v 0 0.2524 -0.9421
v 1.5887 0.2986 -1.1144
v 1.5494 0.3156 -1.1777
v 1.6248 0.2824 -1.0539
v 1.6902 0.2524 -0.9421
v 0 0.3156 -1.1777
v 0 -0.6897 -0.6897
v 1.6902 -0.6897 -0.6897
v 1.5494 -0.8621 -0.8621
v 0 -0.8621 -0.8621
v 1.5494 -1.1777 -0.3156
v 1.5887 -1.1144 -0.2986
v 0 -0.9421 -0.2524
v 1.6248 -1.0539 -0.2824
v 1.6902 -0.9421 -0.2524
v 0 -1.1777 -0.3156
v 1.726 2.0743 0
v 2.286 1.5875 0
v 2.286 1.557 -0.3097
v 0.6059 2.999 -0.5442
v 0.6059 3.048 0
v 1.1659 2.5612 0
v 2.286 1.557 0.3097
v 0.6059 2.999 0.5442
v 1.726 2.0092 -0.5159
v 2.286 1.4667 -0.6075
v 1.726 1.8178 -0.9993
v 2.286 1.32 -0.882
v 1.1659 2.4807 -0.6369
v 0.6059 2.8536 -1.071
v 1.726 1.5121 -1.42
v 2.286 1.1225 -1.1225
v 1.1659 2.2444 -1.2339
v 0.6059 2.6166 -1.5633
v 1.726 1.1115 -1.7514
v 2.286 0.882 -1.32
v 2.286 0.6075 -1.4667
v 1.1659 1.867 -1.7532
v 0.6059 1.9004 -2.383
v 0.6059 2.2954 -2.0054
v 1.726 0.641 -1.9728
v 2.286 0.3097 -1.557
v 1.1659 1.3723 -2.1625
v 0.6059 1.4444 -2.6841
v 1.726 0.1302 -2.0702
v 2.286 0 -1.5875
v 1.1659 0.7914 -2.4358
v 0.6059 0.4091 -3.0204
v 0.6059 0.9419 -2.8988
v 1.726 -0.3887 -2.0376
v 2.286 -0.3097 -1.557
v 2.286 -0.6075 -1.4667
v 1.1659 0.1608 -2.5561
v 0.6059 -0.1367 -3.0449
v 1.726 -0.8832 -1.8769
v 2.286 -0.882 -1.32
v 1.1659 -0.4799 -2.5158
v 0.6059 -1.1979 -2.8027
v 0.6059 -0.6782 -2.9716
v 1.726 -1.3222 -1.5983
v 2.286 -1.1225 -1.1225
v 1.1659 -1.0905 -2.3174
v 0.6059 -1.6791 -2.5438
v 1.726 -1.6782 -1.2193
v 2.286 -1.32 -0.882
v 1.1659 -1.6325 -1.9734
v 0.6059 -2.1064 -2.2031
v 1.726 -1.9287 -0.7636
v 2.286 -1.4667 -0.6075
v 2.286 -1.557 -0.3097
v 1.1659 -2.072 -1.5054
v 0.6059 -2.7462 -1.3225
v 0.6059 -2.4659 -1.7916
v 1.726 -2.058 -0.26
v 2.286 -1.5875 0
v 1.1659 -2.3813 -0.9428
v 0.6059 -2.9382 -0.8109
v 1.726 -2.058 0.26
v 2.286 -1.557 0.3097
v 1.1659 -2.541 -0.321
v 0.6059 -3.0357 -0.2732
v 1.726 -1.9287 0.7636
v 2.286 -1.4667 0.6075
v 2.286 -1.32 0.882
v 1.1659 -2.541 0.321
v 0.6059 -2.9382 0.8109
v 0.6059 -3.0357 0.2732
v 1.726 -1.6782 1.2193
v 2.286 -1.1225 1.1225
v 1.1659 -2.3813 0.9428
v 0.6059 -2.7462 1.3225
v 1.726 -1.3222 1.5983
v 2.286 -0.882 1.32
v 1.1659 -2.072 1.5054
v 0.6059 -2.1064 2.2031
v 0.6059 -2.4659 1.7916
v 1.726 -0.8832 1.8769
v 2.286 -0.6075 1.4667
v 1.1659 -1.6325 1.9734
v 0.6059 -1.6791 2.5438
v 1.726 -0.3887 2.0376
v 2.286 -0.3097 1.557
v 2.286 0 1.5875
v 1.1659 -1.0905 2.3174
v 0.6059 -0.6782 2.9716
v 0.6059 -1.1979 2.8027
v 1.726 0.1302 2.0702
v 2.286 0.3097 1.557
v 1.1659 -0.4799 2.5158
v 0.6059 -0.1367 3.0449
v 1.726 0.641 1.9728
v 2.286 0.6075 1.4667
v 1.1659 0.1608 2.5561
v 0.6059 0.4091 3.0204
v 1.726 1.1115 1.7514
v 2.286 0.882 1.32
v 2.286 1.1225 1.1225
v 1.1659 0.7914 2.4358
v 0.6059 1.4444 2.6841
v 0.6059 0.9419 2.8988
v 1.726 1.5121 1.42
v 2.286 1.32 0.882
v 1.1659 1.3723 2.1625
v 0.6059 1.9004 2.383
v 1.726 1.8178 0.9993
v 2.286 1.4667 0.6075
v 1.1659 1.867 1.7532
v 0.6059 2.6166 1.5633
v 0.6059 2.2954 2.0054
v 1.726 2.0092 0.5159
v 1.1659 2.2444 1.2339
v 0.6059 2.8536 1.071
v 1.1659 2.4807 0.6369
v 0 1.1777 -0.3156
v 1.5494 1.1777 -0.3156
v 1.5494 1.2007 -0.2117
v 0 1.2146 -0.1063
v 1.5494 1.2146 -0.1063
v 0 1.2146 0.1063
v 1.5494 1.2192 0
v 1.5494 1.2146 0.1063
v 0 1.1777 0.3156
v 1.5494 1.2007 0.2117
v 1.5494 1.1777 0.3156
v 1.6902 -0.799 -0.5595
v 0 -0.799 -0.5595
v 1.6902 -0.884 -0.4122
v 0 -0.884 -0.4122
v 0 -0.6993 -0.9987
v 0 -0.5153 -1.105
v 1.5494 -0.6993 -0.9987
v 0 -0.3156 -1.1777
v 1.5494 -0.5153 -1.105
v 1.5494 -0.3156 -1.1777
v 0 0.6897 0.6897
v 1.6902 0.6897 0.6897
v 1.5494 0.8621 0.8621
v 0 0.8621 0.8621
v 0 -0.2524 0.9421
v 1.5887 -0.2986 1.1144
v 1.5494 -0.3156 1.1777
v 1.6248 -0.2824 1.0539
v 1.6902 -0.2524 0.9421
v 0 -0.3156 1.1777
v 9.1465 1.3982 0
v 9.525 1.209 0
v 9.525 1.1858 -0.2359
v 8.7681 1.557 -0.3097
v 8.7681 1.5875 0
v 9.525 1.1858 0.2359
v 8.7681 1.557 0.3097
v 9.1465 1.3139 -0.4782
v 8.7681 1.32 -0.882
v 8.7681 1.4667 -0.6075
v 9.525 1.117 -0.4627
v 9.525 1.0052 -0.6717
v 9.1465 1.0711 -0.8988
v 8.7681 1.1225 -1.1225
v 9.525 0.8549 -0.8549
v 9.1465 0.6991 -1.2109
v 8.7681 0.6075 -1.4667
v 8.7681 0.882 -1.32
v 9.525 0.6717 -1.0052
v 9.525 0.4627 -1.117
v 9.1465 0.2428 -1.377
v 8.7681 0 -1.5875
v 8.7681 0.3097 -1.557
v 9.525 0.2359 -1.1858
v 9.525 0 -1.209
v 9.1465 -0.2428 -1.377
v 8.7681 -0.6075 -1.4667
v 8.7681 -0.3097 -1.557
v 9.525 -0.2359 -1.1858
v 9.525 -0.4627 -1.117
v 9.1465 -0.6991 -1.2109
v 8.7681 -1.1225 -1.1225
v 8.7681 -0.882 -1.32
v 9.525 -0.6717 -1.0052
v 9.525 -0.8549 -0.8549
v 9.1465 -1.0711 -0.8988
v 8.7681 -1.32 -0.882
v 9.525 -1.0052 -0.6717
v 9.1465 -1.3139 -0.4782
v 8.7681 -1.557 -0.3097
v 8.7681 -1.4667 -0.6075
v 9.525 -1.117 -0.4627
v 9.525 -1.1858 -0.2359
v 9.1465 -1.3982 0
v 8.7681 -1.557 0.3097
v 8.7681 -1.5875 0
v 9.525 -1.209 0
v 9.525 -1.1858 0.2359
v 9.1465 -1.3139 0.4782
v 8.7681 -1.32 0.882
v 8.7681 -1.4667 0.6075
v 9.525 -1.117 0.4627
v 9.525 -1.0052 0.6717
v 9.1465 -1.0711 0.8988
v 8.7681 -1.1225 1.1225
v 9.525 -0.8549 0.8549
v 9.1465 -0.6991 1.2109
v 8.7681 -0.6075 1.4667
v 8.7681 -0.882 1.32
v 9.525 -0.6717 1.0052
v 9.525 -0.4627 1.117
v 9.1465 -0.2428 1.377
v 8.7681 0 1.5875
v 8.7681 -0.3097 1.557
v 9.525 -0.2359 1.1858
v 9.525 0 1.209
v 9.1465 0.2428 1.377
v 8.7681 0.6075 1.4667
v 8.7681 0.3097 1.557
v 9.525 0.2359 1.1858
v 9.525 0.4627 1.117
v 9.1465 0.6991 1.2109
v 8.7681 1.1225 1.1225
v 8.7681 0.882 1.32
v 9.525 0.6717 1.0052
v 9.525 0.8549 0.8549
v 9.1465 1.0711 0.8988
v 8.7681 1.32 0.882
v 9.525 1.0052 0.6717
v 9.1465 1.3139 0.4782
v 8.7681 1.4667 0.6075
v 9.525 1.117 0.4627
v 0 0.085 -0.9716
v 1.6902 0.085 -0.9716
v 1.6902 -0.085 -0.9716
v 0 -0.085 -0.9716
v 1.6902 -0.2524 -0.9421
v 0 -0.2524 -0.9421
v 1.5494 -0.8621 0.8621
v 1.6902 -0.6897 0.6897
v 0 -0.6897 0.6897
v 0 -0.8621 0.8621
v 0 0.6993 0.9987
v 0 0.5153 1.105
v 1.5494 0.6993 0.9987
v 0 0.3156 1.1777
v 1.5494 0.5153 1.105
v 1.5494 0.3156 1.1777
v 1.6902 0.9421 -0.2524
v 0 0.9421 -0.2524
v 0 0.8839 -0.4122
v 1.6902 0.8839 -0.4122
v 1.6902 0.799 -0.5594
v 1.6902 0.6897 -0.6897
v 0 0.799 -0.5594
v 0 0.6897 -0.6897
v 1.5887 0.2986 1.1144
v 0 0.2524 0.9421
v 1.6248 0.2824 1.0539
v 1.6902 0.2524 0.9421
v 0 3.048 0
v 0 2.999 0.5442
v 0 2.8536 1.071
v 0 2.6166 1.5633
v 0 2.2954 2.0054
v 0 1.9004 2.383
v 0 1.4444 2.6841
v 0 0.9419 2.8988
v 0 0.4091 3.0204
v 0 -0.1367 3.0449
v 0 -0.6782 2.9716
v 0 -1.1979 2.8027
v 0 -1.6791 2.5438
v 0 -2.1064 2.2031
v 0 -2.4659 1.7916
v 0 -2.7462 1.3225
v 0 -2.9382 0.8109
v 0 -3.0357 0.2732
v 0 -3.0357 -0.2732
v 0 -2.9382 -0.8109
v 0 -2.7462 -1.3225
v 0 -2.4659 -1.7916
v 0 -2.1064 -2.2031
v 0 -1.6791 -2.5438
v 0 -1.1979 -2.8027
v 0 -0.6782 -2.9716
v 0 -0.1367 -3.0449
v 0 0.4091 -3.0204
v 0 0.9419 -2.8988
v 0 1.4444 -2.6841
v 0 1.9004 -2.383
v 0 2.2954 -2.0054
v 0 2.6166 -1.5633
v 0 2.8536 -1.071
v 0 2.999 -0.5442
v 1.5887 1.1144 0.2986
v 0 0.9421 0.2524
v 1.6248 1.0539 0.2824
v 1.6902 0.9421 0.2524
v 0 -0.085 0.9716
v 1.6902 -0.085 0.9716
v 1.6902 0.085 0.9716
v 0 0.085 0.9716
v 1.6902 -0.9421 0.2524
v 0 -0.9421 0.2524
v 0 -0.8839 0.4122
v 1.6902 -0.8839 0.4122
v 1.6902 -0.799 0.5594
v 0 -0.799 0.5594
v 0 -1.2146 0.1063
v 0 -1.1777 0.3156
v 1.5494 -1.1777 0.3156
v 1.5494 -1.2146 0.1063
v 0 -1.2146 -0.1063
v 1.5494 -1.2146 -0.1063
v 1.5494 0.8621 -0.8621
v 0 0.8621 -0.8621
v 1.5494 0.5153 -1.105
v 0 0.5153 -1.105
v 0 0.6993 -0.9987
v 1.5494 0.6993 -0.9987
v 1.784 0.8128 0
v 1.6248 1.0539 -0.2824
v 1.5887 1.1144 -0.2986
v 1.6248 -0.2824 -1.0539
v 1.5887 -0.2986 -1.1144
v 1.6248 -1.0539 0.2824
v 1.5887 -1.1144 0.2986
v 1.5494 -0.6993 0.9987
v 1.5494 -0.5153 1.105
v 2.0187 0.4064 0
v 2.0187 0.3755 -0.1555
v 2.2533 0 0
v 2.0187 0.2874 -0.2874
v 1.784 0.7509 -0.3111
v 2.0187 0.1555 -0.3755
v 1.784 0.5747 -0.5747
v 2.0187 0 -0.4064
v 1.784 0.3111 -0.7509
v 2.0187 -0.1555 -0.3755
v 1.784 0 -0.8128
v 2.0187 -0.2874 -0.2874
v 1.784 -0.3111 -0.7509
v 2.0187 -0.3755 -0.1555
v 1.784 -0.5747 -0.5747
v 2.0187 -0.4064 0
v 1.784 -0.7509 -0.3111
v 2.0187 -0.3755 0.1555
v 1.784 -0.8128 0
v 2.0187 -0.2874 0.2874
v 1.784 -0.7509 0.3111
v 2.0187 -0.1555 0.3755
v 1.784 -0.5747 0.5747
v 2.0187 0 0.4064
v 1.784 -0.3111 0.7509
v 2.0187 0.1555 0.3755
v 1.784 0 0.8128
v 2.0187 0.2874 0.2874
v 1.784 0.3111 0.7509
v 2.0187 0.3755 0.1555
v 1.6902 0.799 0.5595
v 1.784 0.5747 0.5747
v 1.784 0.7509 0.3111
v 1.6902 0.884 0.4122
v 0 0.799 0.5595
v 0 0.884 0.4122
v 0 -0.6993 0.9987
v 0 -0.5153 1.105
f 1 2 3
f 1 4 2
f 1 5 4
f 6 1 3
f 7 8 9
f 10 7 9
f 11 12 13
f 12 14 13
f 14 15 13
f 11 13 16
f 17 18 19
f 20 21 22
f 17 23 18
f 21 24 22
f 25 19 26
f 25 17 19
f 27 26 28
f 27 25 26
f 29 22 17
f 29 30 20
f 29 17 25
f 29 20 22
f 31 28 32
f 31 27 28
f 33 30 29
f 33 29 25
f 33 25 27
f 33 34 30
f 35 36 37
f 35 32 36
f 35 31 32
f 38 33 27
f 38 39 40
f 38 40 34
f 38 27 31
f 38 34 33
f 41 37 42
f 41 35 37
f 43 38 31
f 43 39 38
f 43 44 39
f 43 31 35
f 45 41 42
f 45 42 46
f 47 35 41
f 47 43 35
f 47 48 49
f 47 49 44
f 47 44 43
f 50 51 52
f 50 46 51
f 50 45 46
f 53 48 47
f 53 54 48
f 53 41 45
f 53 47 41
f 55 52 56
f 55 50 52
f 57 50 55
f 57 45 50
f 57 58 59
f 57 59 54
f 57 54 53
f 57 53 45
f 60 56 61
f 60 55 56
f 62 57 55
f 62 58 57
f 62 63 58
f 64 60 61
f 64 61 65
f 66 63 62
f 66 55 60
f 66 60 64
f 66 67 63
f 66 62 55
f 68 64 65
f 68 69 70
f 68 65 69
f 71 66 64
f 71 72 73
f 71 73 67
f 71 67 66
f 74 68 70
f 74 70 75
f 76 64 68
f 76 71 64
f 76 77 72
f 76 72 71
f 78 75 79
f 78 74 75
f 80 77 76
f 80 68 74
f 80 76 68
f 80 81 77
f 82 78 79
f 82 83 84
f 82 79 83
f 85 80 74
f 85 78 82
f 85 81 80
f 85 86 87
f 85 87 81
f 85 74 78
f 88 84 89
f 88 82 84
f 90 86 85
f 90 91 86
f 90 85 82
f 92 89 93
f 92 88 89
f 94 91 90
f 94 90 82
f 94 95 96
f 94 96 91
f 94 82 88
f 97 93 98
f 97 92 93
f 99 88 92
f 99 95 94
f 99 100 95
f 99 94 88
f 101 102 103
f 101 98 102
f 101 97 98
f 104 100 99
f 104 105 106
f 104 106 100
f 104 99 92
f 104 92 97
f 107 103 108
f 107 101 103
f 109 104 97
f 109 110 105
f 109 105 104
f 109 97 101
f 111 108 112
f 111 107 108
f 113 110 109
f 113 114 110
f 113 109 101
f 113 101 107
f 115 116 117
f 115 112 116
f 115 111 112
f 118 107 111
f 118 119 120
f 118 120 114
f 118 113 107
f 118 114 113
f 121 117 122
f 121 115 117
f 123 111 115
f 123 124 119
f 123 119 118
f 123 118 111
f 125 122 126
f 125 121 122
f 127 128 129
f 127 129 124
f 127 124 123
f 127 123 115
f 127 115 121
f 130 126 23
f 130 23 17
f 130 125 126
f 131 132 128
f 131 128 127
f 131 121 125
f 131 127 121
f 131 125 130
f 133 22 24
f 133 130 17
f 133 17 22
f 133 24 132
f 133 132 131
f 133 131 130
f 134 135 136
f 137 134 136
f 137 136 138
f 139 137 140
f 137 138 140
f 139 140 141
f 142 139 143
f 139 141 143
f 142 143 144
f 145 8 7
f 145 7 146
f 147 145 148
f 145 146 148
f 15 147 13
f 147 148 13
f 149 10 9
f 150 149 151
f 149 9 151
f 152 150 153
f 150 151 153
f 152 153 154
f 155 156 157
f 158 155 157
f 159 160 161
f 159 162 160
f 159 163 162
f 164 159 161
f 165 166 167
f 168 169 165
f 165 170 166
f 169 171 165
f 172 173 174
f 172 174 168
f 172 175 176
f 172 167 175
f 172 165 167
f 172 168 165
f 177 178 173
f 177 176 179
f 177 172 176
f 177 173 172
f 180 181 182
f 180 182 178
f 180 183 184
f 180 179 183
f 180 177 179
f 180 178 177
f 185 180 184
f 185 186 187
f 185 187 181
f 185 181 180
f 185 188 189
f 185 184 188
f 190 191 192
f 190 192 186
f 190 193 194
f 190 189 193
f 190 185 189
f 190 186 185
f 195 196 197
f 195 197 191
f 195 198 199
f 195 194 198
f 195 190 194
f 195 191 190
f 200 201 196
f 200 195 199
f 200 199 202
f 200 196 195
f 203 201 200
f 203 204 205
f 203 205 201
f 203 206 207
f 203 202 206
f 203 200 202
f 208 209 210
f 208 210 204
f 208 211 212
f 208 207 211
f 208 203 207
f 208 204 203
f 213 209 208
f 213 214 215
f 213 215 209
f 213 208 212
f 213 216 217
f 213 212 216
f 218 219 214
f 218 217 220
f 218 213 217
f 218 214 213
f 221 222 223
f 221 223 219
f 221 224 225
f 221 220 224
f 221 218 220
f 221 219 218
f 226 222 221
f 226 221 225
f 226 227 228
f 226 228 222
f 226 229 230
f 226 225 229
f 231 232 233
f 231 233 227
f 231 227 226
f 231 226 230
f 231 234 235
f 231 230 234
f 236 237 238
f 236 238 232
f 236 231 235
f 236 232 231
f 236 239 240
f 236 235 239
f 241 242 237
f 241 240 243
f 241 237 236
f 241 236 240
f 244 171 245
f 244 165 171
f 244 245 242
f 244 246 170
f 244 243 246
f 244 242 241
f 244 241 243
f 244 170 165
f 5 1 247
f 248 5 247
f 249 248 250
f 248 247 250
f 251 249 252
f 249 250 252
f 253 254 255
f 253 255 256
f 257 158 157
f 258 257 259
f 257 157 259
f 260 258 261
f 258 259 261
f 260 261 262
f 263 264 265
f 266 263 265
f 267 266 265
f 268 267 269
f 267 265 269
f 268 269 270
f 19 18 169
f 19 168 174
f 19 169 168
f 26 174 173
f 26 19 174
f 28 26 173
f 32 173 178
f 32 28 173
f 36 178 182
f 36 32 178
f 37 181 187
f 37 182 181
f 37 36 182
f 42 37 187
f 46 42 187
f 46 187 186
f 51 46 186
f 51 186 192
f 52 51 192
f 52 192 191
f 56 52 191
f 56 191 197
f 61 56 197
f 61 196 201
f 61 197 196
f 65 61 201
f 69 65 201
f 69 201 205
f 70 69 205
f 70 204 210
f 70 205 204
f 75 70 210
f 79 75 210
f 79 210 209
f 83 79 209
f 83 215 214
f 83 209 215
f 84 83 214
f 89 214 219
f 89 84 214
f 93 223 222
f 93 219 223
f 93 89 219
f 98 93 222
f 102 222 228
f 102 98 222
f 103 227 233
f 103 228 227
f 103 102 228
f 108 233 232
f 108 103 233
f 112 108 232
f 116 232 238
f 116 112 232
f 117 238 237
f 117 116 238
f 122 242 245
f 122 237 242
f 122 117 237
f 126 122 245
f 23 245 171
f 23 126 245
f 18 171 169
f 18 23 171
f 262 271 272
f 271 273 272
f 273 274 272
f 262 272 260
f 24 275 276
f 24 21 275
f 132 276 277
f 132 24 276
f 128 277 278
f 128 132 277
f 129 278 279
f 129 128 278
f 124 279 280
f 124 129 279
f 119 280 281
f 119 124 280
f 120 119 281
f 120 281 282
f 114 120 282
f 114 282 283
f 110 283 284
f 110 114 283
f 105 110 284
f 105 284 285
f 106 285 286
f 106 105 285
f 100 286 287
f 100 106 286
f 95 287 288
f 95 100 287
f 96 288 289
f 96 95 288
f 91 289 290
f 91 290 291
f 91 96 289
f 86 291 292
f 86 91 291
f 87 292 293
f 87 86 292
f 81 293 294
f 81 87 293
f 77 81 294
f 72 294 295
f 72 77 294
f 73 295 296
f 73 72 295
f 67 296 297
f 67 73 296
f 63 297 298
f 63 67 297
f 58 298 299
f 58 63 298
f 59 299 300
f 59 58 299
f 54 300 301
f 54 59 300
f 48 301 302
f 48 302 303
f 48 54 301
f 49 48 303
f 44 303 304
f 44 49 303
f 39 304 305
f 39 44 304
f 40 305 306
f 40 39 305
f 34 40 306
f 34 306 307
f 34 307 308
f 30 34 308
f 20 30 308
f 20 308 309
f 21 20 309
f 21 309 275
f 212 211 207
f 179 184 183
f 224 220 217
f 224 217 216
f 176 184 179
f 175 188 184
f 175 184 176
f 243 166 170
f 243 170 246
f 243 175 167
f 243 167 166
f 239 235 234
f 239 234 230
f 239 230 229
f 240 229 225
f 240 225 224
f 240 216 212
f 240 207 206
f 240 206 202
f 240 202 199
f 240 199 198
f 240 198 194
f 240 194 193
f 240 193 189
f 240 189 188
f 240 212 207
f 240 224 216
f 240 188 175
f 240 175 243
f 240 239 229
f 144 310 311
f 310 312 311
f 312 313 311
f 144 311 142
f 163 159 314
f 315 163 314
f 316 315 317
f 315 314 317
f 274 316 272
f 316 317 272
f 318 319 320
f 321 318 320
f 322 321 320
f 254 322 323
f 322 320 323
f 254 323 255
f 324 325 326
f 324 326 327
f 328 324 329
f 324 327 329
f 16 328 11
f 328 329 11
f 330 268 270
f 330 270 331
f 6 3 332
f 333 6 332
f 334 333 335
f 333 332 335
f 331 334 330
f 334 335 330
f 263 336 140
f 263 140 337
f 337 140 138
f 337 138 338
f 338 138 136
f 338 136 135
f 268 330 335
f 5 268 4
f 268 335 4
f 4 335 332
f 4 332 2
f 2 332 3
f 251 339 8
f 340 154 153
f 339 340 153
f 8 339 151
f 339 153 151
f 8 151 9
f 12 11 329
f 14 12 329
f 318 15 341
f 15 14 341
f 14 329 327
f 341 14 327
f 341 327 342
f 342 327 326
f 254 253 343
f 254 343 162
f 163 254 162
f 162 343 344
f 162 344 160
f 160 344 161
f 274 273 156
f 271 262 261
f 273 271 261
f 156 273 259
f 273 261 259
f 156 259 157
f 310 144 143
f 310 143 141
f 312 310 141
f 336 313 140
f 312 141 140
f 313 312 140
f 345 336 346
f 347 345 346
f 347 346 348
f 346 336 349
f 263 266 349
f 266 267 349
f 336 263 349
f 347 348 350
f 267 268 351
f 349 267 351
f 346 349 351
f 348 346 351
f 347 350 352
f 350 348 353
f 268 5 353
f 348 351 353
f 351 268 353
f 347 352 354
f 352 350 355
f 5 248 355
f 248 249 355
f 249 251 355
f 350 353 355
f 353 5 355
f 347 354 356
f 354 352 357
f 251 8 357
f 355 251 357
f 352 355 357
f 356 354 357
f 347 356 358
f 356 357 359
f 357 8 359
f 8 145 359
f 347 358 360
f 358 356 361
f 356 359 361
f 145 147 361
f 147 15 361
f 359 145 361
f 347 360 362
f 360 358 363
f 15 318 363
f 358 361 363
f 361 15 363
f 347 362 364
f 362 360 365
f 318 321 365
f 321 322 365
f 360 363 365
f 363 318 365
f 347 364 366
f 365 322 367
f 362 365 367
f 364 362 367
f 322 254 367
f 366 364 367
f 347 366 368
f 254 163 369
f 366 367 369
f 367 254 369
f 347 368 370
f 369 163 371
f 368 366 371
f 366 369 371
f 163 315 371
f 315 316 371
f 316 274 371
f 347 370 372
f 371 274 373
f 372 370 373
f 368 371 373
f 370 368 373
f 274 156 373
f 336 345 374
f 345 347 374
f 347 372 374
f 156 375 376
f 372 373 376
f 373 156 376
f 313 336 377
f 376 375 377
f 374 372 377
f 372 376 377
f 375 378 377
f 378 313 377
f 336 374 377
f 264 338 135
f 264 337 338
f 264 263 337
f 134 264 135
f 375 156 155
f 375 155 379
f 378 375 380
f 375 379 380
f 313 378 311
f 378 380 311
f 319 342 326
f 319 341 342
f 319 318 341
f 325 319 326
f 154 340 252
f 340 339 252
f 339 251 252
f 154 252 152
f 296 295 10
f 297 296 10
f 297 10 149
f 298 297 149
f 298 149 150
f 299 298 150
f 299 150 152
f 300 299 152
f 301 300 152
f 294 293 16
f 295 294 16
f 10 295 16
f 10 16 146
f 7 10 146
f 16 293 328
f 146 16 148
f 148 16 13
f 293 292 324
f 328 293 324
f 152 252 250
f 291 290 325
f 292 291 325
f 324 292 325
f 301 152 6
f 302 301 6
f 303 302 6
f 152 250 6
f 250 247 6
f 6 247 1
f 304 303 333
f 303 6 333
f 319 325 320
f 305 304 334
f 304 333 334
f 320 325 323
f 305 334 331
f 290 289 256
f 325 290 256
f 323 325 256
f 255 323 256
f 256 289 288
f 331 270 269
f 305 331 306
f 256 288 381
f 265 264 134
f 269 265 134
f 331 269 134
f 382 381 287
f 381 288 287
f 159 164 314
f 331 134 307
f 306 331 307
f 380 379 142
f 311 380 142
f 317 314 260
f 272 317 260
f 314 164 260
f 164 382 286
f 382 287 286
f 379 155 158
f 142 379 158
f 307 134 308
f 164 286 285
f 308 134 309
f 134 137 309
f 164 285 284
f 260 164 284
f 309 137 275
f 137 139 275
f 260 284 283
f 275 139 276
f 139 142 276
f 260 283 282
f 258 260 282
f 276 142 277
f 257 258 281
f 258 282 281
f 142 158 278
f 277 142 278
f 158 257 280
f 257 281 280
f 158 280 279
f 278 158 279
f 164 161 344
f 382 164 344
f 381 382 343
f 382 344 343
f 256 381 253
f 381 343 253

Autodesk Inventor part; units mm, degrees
ref_plane "YZ Plane" through (0, 0, 0) normal (1, 0, 0) x (0, 1, 0)
ref_plane "XZ Plane" through (0, 0, 0) normal (0, 1, 0) x (-1, 0, 0)
sketch "Sketch1" plane through (0, 0, 0) normal (0, 0, 1) x (1, 0, 0)
  line L0 (9.525, 0) -> (9.525, 1.5875)
  line L1 (9.525, 1.5875) -> (2.286, 1.5875)
  line L2 (0, 3.048) -> (0, 1.2192)
  line L3 (0, 1.2192) -> (1.5494, 1.2192)
  line L4 (1.5494, 1.2192) -> (2.2533, 0)
  line L5 (2.2533, 0) -> (9.525, 0)
  line L6 (0, 3.048) -> (0.6059, 3.048)
  line L7 (0.6059, 3.048) -> (2.286, 1.5875)
  line L8 (-1.905, 0) -> (11.43, 0) projected
  line L9 (0, -0.6096) -> (0, 3.6576) projected
  dimension "d0" = 9.525
  dimension "d1" = 1.5494
  dimension "d2" = 3.175
  dimension "d3" = 2.286
  dimension "d4" = 41
  dimension "d5" = 2.4384
  dimension "d6" = 60
  dimension "d7" = 6.096
revolve "Body" add sketch "Sketch1" angle 360 about axis through (2.2533, 0, 0) along (1, 0, 0) contours L5 L4 L3 L2 L6 L7 L1 L0
sketch "Sketch2" plane through (0, 0, 0) normal (-1, 0, 0) x (0, 0, 1)
  circle A0 centre (0, 0) radius 3.048 projected
  circle A1 centre (0, 0) radius 1.2192 projected
  line L0 (0.9421, 0.2524) -> (1.1777, 0.3156)
  line L1 (0.9421, -0.2524) -> (1.1777, -0.3156)
  arc A2 (0.9421, -0.2524) -> (0.9421, 0.2524) centre (0, 0) ccw
  arc A3 (1.1777, -0.3156) -> (1.1777, 0.3156) centre (0, 0) ccw
  line L2 (0, -4.2672) -> (0, 4.2672) projected
  line L3 (-4.2672, 0) -> (4.2672, 0) projected
  line L4 (0.9421, 0.2524) -> (0, 0) construction
  line L5 (0, 0) -> (0.9421, -0.2524) construction
  line L6 (0.2524, 0.9421) -> (0.3156, 1.1777)
  line L7 (0.6897, 0.6897) -> (0.8621, 0.8621)
  arc A4 (0.6897, 0.6897) -> (0.2524, 0.9421) centre (0, 0) ccw
  arc A5 (0.8621, 0.8621) -> (0.3156, 1.1777) centre (0, 0) ccw
  line L8 (-0.6897, 0.6897) -> (-0.8621, 0.8621)
  line L9 (-0.2524, 0.9421) -> (-0.3156, 1.1777)
  arc A6 (-0.2524, 0.9421) -> (-0.6897, 0.6897) centre (0, 0) ccw
  arc A7 (-0.3156, 1.1777) -> (-0.8621, 0.8621) centre (0, 0) ccw
  line L10 (-0.9421, -0.2524) -> (-1.1777, -0.3156)
  line L11 (-0.9421, 0.2524) -> (-1.1777, 0.3156)
  arc A8 (-0.9421, 0.2524) -> (-0.9421, -0.2524) centre (0, 0) ccw
  arc A9 (-1.1777, 0.3156) -> (-1.1777, -0.3156) centre (0, 0) ccw
  line L12 (-0.2524, -0.9421) -> (-0.3156, -1.1777)
  line L13 (-0.6897, -0.6897) -> (-0.8621, -0.8621)
  arc A10 (-0.6897, -0.6897) -> (-0.2524, -0.9421) centre (0, 0) ccw
  arc A11 (-0.8621, -0.8621) -> (-0.3156, -1.1777) centre (0, 0) ccw
  line L14 (0.6897, -0.6897) -> (0.8621, -0.8621)
  line L15 (0.2524, -0.9421) -> (0.3156, -1.1777)
  arc A12 (0.2524, -0.9421) -> (0.6897, -0.6897) centre (0, 0) ccw
  arc A13 (0.3156, -1.1777) -> (0.8621, -0.8621) centre (0, 0) ccw
  dimension "d8" = 1.9507
  dimension "d9" = 2.4384
  dimension "d10" = 15
  dimension "d11" = 15
  dimension "d22" = 360
extrude "Slot" add sketch "Sketch2" against normal up to next contours L3 A2 L0 A1 | A1 L1 A2 L3 | L3 A8 L10 A1 | A1 L11 A8 L3 | A1 L7 A4 L6 | L9 A6 L8 A1 | A1 L13 A10 L12 | L15 A12 L14 A1
thread "Thread" size "5-40 UNC" class "2A" standard "ANSI Unified Screw Threads" length 5.6515
chamfer "Chamfer1" distance 0.3785 distance2 0.7569 1 edges at (9.525, -1.5875, 0) measured on face at (9.525, -0.1593, -0.6099)
ref_plane "Work Plane1" through (66.6877, 0, 0) normal (0, 0, -1) x (1, 0, 0)
equation "\"d0\" = NLG"
equation "\"d1\" = INTI"
equation "\"d2\" = GD"
equation "\"d3\" = KOH"
equation "\"d4\" = 0.5 * SEWI"
equation "\"d5\" = SW"
equation "\"d7\" = KOD"
equation "\"d8\" = 0.8 * SW"
equation "\"d9\" = SW"
equation "\"d15\" = GEL"
equation "\"d17\" = -0.5 * SPD + 0.5 * GD"
equation "\"d18\" = GUL"
equation "\"NLG\" = 9.525"
equation "\"SW\" = 2.4384"
equation "\"INTI\" = 1.5494"
equation "\"GEL\" = 5.6515"
equation "\"KOH\" = 2.286"
equation "\"KOD\" = 6.096"
equation "\"GUL\" = 0.75692"
equation "\"SPD\" = 2.41808"
equation "\"GD\" = NND"
equation "\"SEWI\" = 82deg"
equation "\"TOA\" = 30deg"
equation "\"GD1\" = SPD"
equation "\"EPV\" = 4.11221"
equation "\"THREADDIA\" = 3.175"
equation "\"BDM\" = NND"
equation "\"NND\" = 3.175"
equation "\"GAL\" = 1.5875"
equation "\"E0\" = 1.155 * SW"
properties part number "ANSI B18.3 - 5-40 UNC x 0.375, SSFCHCSI" material "Steel, Mild"
